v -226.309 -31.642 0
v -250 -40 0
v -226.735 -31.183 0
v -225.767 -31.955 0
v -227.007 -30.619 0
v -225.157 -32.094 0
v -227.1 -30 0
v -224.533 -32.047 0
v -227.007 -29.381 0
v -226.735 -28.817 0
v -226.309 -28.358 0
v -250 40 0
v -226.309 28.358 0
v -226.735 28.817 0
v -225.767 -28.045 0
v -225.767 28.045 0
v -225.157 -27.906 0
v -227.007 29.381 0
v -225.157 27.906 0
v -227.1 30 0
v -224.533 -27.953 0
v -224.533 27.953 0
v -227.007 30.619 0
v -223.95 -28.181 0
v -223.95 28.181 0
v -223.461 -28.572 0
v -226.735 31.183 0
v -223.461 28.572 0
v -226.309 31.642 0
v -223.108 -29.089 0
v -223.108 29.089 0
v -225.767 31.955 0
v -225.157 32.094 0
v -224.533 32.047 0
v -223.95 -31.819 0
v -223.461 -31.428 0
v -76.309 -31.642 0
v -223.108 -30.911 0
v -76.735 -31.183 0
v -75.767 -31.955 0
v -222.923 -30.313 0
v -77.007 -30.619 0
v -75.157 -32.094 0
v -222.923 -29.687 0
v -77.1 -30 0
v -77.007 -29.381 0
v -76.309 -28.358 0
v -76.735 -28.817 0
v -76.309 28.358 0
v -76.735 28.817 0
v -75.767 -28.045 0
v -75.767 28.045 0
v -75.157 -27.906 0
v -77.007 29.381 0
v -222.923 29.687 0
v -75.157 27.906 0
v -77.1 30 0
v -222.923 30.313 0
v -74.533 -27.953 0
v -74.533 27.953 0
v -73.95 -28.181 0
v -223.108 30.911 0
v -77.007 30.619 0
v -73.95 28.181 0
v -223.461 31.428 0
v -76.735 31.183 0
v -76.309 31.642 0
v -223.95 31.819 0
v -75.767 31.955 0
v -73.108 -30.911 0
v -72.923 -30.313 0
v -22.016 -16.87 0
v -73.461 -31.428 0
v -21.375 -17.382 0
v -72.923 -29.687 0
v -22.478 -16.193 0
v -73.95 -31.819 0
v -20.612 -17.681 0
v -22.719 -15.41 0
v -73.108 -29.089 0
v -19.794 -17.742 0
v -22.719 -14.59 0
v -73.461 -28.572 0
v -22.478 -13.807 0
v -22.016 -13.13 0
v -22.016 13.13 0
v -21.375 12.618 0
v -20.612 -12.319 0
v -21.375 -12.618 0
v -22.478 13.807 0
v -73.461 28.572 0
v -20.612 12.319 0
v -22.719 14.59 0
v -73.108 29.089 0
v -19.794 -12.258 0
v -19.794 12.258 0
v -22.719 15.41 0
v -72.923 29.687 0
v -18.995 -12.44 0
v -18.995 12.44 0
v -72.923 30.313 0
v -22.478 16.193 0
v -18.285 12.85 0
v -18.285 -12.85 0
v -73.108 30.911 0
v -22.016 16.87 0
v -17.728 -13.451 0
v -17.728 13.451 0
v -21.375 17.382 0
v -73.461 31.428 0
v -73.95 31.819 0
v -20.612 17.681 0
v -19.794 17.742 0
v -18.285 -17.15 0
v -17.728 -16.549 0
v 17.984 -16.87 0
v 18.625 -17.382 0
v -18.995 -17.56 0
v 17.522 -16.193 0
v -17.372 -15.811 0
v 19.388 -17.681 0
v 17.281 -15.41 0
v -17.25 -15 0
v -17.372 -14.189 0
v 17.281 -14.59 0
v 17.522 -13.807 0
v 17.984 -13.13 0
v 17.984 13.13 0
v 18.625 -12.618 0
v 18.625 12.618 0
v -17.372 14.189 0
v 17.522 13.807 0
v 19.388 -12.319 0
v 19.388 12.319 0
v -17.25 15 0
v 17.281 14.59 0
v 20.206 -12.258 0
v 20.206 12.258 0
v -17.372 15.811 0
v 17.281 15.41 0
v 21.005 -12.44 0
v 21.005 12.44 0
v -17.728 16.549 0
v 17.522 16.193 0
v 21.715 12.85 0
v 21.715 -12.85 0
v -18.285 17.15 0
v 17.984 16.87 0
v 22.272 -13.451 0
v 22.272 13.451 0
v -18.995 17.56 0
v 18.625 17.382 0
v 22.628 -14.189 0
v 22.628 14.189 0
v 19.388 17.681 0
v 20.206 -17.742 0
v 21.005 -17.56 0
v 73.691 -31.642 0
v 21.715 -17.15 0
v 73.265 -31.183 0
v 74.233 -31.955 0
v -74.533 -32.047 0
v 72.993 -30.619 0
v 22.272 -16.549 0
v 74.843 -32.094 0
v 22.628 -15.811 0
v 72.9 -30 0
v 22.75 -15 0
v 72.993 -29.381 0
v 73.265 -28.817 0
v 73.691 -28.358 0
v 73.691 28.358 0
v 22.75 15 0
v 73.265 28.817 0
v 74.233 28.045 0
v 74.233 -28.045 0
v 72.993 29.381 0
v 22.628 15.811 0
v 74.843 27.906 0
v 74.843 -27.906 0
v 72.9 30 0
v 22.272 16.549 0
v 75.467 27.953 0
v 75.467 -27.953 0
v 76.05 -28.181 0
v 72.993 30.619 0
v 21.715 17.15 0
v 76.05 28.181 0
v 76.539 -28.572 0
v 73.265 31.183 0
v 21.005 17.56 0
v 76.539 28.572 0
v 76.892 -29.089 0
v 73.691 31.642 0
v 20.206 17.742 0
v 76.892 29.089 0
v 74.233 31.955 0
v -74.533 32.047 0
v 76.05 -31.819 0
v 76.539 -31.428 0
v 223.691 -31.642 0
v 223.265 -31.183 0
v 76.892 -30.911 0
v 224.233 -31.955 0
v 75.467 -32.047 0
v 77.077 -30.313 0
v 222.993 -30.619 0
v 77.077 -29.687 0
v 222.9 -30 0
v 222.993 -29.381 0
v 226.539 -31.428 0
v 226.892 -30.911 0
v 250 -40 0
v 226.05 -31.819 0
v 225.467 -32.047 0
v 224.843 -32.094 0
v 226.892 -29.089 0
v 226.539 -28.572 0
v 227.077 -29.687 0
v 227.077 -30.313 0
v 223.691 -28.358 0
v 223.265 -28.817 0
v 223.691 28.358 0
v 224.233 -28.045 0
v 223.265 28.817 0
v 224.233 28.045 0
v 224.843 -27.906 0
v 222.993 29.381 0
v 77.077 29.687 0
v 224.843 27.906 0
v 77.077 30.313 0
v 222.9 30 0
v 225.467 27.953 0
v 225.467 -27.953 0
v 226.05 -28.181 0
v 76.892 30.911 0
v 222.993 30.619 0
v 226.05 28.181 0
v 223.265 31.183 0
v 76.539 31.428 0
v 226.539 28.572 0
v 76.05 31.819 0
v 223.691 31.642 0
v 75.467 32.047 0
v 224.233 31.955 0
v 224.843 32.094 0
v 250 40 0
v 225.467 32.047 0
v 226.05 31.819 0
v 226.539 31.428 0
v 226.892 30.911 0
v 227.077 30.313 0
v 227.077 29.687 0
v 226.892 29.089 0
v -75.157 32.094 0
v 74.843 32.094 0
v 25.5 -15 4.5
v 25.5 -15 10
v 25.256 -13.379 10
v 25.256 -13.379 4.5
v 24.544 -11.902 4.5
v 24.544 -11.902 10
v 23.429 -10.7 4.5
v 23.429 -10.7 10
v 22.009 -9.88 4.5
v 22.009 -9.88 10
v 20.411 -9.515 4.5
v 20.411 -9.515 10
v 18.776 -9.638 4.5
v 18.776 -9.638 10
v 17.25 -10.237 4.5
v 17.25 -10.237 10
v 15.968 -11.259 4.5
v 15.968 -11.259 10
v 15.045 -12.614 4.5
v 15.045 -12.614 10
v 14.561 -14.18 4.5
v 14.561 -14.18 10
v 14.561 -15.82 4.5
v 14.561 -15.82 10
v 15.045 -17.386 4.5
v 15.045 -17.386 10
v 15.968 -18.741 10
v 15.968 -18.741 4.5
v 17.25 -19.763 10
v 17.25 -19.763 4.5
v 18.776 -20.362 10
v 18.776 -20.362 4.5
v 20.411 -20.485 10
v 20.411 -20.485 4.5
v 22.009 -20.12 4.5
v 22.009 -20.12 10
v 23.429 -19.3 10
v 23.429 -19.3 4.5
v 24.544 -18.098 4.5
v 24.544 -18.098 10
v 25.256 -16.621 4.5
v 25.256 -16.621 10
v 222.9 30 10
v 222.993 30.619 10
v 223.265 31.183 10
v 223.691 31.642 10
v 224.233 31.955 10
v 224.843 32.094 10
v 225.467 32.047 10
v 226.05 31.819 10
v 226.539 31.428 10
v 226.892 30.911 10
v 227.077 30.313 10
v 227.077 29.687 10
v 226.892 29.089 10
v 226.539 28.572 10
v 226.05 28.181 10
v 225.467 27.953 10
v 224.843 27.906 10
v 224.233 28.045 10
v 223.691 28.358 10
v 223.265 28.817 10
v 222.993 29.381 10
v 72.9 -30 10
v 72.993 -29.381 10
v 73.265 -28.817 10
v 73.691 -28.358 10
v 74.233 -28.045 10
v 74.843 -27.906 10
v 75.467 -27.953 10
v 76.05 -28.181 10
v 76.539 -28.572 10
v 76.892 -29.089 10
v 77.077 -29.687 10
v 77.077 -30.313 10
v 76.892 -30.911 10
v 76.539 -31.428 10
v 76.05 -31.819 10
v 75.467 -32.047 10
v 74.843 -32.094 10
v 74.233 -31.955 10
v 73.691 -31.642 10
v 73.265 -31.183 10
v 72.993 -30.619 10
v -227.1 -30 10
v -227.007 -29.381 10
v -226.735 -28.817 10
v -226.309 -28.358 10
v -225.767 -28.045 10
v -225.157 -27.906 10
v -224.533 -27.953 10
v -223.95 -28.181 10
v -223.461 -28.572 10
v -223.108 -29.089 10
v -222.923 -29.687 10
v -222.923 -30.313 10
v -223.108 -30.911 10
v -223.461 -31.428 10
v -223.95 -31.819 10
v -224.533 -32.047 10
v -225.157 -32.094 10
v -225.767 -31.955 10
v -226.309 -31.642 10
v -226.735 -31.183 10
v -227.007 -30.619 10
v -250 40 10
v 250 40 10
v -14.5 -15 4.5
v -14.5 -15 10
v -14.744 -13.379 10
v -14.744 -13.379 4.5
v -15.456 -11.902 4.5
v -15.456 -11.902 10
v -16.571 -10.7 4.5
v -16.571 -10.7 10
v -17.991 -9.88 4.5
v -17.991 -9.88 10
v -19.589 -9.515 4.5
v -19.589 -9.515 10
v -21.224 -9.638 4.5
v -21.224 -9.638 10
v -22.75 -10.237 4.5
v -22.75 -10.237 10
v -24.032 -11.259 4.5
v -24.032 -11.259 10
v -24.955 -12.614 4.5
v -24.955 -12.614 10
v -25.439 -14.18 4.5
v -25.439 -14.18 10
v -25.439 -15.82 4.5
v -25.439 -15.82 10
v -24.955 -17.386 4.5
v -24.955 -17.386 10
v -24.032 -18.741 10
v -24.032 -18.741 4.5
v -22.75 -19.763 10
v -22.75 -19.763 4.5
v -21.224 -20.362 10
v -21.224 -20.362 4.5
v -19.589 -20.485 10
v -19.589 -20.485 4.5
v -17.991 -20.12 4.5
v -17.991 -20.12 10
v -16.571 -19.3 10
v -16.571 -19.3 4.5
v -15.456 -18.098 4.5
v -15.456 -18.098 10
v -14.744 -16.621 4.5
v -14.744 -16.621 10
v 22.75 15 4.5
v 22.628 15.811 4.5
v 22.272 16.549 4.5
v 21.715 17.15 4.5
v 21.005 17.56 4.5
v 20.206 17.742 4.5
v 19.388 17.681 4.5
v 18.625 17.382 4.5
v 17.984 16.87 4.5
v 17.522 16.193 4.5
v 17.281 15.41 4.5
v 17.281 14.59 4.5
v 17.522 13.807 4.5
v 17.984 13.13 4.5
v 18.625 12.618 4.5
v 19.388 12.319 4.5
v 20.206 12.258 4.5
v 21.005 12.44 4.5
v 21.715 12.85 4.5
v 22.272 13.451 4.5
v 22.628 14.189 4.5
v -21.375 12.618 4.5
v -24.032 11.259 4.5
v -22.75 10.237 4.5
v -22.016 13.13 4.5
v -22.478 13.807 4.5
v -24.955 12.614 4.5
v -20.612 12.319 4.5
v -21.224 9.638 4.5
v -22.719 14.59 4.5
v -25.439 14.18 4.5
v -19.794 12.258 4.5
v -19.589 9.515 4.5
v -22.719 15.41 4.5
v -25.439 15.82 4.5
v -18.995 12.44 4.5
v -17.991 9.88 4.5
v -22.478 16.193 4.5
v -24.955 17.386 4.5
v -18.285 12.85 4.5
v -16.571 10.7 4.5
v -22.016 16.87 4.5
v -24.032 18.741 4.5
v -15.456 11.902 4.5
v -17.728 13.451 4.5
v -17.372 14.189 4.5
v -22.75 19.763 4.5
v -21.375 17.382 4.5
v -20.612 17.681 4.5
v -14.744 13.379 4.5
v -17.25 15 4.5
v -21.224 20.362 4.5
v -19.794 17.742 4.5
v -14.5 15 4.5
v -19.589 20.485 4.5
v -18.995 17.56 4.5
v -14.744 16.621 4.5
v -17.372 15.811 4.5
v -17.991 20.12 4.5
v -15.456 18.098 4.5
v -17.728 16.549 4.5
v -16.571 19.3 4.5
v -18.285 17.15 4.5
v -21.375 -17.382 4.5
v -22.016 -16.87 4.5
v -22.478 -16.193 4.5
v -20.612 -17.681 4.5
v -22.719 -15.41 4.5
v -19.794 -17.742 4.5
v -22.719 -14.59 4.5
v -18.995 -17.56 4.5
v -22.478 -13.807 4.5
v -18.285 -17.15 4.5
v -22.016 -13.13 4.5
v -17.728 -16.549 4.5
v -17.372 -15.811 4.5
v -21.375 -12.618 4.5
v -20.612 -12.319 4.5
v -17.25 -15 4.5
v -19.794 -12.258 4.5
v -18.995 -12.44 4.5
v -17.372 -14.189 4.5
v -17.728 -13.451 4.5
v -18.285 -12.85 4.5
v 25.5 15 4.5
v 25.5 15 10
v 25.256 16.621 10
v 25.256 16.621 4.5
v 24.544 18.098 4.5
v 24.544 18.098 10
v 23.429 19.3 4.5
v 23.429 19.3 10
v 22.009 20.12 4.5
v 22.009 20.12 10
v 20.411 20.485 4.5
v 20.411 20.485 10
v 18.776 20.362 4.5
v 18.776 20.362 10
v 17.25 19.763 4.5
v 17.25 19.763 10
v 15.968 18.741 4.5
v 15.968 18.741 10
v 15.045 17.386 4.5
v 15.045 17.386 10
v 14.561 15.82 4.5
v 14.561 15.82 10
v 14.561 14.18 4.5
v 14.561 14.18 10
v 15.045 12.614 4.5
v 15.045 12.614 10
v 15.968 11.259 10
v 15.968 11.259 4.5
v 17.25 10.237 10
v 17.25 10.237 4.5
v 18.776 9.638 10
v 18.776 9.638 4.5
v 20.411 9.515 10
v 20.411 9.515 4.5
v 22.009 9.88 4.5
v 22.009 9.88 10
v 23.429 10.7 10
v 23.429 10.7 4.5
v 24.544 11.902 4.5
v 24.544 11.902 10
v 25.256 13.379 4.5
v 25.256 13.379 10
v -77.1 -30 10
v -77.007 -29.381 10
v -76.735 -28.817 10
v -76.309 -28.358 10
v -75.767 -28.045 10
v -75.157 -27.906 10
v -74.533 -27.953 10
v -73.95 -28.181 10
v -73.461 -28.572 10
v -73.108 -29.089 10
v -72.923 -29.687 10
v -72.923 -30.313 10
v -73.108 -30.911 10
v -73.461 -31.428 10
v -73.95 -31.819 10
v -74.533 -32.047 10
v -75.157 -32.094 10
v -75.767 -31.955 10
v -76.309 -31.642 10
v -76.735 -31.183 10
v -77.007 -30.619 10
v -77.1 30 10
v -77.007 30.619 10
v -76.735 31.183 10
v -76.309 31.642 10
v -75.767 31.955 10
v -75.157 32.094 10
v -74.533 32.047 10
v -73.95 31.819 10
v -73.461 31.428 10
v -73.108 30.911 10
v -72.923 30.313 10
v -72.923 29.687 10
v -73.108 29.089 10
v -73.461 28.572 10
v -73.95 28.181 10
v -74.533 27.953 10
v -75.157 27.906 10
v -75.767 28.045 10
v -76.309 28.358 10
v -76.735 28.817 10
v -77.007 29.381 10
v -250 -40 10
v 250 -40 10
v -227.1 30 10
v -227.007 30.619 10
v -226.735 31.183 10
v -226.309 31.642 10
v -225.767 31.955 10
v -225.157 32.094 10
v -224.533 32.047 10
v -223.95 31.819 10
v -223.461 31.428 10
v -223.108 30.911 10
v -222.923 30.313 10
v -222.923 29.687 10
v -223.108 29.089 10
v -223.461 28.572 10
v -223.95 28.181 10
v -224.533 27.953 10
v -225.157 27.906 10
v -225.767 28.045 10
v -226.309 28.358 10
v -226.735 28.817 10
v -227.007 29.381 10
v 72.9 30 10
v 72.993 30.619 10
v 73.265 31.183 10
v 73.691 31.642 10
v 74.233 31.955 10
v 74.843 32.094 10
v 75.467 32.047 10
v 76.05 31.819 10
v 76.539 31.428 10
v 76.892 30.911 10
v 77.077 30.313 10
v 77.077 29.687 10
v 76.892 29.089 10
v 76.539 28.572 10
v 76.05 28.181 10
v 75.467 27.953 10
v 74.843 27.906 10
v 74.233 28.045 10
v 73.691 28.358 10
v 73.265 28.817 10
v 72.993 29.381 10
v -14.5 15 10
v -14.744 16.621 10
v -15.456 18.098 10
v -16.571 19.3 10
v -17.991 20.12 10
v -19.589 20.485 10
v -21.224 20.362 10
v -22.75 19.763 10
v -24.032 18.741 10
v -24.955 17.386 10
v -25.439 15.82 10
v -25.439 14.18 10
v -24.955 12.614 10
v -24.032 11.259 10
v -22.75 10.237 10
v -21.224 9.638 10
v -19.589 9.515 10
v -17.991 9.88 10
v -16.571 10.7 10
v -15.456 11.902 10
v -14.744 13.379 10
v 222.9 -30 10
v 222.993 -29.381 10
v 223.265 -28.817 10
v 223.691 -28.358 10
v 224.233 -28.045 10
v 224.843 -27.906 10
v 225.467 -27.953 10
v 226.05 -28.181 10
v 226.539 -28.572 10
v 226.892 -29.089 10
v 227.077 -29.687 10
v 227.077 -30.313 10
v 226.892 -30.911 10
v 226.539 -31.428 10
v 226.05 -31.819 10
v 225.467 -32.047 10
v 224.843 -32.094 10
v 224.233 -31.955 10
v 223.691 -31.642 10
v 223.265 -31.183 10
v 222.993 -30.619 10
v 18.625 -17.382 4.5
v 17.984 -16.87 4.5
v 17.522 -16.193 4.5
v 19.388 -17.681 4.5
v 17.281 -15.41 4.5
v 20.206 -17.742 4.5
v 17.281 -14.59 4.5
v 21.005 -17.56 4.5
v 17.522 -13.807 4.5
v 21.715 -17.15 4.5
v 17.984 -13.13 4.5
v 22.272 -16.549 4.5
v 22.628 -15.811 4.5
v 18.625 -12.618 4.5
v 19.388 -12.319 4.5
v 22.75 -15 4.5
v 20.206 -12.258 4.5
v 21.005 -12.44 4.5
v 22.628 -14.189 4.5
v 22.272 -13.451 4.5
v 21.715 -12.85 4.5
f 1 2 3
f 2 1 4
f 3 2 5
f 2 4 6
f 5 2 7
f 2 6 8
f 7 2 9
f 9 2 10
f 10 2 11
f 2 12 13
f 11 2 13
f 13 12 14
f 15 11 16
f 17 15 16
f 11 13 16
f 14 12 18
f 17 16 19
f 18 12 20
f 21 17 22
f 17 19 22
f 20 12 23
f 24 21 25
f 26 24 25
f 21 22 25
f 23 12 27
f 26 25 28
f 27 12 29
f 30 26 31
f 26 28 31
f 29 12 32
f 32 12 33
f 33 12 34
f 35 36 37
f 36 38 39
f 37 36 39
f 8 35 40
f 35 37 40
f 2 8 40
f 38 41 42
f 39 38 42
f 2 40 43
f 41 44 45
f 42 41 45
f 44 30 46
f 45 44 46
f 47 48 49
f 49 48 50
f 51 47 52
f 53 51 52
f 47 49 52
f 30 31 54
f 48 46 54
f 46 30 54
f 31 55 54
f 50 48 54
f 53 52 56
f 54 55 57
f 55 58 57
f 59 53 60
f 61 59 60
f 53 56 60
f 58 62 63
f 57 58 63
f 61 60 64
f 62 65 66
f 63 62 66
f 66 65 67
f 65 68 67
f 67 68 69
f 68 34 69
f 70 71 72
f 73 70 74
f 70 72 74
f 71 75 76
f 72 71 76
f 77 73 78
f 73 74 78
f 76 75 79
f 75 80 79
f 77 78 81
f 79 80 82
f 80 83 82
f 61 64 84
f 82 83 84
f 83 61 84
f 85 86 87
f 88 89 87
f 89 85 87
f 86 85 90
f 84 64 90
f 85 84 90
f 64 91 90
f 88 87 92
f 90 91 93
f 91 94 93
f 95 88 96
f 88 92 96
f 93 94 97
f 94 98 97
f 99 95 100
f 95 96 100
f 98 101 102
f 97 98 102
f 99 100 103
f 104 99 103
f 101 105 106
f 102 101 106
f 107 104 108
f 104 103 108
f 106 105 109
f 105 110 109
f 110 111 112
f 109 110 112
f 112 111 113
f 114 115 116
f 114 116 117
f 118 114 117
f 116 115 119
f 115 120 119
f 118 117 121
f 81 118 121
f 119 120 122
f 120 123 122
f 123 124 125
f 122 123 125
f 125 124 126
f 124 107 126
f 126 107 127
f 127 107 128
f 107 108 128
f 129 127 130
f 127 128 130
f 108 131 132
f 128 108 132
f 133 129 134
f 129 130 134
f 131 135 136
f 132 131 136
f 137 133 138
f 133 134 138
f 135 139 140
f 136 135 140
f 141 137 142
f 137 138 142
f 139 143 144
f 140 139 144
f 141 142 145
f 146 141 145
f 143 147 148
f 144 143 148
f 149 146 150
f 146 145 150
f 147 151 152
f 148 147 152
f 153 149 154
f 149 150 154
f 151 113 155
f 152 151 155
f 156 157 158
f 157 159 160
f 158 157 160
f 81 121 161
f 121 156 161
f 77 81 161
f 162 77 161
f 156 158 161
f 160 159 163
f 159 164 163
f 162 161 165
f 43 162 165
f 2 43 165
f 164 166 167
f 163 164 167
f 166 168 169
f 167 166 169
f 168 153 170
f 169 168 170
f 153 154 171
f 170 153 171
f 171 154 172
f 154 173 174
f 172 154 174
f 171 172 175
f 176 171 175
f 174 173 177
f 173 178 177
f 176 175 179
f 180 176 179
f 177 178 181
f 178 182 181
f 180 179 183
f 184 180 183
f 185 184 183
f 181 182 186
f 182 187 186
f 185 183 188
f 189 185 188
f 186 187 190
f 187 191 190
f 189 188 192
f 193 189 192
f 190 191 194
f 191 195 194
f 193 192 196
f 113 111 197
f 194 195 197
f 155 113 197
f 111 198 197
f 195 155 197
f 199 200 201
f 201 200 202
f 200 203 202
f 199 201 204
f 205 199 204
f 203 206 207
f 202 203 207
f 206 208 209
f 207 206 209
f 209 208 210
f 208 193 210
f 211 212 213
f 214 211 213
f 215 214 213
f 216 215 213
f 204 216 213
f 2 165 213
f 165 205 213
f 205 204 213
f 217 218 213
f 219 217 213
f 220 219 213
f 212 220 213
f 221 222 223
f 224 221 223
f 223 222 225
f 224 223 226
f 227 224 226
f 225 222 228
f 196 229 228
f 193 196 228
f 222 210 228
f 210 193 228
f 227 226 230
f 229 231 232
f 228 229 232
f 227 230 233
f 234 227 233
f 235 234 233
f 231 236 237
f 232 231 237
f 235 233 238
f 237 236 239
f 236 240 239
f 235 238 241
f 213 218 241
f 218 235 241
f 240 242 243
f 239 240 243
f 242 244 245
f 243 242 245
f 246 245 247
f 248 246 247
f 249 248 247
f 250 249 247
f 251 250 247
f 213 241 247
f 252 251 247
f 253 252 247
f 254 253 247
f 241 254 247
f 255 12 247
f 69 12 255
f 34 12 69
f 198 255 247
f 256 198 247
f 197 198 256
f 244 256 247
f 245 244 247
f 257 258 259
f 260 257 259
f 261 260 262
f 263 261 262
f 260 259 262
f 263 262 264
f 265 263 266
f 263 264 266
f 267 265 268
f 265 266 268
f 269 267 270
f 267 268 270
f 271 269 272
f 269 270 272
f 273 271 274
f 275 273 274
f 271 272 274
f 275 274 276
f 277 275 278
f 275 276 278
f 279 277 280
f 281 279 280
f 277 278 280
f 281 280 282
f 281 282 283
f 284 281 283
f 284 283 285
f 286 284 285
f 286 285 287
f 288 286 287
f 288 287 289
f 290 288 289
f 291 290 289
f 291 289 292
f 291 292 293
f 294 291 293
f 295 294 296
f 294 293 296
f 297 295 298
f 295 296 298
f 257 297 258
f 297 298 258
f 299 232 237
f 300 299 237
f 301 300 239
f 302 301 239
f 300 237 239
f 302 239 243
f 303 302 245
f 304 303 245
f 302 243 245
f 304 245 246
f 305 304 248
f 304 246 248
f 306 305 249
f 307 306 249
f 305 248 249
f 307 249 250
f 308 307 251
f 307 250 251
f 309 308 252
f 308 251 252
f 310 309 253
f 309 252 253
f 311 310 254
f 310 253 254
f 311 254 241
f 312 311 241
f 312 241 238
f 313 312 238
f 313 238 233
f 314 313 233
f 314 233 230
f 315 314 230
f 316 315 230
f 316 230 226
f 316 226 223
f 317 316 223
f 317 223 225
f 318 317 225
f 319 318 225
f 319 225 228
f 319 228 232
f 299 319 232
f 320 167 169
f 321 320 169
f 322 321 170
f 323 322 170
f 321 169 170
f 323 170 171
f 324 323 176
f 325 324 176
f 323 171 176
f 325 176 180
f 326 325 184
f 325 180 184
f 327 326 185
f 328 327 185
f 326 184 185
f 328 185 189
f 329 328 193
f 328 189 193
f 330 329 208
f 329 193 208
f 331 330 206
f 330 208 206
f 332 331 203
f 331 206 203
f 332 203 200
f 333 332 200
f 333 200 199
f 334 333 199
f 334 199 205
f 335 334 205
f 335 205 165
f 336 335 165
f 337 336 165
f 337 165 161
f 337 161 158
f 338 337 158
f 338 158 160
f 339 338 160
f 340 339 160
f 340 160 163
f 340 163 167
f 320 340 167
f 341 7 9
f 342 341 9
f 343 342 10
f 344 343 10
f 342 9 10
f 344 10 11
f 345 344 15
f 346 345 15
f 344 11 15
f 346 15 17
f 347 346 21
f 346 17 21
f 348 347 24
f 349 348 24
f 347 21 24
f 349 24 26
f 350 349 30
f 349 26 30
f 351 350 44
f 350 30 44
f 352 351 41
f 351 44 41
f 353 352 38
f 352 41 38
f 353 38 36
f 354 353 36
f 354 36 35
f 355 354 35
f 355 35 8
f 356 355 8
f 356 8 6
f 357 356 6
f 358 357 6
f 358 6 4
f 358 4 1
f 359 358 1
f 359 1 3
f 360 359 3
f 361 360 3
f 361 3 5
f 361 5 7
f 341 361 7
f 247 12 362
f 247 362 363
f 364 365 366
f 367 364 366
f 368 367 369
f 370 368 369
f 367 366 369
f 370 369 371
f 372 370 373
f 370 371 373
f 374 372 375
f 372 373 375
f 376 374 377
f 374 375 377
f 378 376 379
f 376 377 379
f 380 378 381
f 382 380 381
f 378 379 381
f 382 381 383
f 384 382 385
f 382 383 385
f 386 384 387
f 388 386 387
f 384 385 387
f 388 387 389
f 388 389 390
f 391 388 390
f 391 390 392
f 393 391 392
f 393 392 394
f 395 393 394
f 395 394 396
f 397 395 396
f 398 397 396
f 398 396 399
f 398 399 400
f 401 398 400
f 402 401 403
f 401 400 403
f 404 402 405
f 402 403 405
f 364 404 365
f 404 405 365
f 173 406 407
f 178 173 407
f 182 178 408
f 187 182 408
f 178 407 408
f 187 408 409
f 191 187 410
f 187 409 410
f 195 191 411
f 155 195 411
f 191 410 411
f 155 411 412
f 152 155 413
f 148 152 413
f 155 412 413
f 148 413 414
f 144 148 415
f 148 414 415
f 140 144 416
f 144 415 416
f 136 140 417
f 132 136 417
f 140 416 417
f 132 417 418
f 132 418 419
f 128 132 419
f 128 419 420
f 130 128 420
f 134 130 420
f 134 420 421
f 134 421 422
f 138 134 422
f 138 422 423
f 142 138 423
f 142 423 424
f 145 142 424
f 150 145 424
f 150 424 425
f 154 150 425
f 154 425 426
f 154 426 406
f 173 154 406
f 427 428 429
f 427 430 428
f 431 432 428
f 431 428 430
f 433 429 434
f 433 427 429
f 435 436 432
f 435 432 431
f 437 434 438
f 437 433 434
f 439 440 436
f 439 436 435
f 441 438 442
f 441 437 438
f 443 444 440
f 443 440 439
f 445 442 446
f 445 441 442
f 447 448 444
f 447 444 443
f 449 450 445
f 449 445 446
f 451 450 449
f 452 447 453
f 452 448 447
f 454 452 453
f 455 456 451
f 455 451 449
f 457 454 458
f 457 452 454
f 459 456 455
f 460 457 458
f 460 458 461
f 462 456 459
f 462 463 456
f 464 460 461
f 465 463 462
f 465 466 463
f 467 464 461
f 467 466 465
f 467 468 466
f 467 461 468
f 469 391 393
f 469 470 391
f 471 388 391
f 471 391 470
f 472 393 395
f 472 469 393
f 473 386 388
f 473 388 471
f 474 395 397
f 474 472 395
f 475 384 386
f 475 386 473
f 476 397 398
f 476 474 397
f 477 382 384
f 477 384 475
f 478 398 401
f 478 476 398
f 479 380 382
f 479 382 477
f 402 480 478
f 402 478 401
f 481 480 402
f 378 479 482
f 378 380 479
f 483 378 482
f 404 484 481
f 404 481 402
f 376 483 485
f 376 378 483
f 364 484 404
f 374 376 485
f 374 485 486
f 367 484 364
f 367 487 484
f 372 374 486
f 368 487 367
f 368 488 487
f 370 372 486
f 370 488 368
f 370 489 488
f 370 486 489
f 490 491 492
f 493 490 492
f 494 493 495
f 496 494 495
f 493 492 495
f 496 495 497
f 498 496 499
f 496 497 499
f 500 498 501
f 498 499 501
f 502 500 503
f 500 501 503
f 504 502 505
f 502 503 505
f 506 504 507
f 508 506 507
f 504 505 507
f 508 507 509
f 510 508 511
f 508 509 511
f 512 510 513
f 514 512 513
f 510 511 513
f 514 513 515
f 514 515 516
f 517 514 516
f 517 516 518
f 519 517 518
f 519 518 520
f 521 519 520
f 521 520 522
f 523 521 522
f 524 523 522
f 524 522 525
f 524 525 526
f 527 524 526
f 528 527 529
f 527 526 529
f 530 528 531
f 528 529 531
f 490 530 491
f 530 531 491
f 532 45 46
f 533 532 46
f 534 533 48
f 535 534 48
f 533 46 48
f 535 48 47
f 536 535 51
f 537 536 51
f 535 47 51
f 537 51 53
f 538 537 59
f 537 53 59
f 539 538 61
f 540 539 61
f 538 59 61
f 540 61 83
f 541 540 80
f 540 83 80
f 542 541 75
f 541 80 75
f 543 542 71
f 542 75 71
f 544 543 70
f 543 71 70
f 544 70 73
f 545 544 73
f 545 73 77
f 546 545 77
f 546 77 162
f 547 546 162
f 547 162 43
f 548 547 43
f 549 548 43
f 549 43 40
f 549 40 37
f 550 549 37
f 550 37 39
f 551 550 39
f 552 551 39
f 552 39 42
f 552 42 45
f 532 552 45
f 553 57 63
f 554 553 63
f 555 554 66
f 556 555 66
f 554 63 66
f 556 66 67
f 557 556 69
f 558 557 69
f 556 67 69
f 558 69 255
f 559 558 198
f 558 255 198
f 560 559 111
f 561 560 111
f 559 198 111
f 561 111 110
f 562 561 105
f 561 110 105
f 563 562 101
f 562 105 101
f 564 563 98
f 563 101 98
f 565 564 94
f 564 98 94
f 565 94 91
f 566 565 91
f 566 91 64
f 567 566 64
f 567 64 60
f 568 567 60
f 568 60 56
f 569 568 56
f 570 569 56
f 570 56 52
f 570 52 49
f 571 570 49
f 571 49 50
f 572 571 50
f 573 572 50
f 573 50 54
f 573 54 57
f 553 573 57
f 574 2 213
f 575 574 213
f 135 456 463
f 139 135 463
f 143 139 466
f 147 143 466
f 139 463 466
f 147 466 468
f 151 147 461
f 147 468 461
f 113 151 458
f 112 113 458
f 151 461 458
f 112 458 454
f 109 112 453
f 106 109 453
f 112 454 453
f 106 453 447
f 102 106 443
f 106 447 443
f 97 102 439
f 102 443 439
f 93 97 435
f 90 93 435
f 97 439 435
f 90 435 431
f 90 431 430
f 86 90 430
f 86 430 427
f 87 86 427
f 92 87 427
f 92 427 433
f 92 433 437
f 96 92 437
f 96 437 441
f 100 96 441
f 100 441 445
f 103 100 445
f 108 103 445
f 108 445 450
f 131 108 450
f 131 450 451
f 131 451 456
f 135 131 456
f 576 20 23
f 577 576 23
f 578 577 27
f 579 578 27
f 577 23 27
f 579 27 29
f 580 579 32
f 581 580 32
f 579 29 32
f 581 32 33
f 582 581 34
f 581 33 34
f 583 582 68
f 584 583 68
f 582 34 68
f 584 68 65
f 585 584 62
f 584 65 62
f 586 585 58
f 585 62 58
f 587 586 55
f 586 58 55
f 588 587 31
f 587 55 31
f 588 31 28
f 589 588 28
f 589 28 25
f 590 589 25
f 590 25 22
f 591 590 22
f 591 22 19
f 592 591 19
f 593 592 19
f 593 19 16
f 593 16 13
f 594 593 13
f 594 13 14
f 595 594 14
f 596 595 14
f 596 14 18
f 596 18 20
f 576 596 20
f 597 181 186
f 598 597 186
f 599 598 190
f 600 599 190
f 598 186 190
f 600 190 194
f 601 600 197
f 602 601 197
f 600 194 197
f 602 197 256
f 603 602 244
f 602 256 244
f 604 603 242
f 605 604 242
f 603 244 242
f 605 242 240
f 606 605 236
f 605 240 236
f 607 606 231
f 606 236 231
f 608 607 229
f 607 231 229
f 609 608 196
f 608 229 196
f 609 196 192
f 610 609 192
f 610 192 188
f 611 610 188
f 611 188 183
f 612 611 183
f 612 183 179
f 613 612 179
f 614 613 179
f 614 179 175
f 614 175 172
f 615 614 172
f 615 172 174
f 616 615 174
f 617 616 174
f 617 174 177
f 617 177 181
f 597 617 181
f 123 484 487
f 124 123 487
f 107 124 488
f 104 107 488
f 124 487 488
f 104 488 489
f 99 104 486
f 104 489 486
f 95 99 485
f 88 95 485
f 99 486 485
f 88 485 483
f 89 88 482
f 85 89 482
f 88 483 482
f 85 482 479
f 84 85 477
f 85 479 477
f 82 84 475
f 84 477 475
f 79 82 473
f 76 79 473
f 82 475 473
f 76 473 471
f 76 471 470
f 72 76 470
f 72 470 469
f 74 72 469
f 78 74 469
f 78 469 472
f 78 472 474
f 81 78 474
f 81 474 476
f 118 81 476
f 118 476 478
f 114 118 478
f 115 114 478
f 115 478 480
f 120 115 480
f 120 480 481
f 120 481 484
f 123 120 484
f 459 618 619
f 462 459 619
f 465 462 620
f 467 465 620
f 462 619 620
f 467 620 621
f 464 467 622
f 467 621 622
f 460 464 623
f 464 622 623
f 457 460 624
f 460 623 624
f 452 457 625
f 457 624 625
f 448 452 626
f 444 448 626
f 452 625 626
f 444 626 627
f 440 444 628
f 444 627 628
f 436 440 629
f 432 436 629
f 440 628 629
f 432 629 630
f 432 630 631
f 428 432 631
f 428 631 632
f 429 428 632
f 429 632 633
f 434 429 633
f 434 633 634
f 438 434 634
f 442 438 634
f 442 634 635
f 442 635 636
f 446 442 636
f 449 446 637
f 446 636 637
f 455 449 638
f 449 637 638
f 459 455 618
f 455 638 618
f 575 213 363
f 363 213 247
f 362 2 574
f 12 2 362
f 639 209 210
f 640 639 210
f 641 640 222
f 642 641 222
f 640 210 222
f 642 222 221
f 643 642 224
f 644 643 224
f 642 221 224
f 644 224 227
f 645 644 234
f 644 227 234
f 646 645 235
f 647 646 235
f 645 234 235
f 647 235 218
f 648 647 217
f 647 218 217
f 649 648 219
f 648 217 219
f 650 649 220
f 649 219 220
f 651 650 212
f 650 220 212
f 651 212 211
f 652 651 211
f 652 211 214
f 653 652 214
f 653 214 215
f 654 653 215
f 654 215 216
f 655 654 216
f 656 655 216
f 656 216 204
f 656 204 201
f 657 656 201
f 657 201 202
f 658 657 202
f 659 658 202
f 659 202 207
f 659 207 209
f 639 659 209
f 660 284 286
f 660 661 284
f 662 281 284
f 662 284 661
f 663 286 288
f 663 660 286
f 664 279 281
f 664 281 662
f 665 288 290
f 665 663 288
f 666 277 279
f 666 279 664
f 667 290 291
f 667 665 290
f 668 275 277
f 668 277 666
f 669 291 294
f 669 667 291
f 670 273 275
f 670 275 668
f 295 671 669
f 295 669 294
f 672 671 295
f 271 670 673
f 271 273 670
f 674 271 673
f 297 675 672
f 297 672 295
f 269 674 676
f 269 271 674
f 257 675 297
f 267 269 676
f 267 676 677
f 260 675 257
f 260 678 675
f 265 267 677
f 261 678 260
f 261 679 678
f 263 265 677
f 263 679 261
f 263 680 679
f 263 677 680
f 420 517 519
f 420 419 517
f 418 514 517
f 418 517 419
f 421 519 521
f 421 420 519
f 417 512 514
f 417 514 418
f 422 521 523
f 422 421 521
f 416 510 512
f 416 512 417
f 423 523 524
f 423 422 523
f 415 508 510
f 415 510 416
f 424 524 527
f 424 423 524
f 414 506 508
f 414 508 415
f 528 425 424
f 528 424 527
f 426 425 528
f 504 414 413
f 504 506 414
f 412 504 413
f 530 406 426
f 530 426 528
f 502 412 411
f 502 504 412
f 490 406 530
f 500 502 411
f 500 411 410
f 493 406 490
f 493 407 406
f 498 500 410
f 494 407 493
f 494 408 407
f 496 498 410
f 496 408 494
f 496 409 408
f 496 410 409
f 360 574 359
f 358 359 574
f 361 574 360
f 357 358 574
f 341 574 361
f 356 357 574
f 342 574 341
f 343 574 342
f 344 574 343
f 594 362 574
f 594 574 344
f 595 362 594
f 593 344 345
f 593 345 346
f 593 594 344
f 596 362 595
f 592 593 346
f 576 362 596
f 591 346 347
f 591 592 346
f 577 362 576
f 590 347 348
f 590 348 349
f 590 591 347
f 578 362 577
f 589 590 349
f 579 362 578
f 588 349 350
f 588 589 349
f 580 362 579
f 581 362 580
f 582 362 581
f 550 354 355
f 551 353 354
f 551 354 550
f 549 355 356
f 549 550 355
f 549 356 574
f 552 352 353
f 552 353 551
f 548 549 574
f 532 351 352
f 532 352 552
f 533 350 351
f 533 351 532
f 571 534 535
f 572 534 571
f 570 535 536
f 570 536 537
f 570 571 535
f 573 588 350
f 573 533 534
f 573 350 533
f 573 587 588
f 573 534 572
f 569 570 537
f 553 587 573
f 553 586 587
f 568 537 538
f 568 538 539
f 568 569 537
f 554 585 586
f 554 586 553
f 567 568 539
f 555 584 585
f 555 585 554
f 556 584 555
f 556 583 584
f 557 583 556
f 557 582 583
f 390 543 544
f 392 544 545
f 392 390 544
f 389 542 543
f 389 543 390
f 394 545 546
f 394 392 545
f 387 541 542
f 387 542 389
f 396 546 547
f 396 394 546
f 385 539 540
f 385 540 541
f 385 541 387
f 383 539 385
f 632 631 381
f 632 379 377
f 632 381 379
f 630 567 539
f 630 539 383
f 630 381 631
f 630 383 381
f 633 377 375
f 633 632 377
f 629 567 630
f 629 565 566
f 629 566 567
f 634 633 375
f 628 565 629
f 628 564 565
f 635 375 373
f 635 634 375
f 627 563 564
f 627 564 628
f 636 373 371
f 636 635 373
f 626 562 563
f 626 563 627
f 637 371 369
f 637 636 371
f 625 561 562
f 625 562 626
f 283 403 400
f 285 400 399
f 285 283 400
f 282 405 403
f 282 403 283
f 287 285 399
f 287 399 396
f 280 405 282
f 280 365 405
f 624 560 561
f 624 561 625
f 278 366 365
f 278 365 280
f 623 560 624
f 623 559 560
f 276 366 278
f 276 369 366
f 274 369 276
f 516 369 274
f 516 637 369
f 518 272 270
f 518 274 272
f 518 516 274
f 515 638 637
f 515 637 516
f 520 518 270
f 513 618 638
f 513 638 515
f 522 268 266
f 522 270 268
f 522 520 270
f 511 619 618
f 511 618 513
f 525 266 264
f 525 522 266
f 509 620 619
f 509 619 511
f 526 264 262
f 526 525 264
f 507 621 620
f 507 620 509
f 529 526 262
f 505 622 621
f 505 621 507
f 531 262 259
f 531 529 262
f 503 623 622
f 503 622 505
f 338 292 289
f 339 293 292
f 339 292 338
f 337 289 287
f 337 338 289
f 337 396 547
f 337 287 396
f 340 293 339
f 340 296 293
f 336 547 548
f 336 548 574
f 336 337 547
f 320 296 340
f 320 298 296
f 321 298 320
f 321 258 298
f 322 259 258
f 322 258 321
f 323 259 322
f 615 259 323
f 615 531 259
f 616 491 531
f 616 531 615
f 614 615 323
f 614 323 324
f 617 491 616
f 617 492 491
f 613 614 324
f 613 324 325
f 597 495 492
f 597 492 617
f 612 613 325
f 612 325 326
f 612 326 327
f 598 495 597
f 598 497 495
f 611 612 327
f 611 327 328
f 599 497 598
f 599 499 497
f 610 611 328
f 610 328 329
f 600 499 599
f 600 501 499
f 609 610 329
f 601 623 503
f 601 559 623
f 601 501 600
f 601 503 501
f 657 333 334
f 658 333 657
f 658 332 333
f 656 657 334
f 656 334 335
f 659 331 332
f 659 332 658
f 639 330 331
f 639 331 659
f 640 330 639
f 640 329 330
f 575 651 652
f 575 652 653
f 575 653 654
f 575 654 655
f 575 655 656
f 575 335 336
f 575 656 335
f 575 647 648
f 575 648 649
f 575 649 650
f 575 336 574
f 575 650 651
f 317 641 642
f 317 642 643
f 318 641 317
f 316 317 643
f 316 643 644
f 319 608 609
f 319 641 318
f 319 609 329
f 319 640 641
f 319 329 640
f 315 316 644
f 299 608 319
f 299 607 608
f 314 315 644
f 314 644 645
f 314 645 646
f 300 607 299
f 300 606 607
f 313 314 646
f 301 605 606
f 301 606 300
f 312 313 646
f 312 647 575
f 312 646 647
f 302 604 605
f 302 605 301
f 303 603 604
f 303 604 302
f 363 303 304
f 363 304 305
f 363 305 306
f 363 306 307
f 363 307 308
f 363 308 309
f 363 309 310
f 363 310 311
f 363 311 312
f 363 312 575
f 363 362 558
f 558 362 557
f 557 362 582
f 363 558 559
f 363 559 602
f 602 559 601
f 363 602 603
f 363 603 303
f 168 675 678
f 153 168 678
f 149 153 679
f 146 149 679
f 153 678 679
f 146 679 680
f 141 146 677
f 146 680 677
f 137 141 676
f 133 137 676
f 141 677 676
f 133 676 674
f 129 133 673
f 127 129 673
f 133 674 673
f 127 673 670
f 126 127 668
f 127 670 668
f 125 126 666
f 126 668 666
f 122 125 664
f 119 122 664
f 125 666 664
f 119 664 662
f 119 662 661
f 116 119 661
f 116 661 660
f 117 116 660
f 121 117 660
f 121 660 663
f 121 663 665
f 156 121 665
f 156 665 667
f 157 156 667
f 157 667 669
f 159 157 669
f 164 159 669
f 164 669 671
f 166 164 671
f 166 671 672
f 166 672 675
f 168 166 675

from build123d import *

# Parameters (mm, degrees)
SKETCH1_W             = 500
SKETCH1_H             = 80
BOSS_EXTRUDE1_DEPTH   = 10
SKETCH2_R             = 2.75
CUT_EXTRUDE1_DEPTH    = 11
SKETCH3_R             = 5.5
CUT_EXTRUDE2_DEPTH    = 5.5
M5_TAPPED_HOLE1_D     = 4.2
M5_TAPPED_HOLE1_DEPTH = 12.4
M5_TAPPED_HOLE1_TIP   = 1.2618073


with BuildPart() as part:
    # Sketch1 → Boss-Extrude1 (new body)
    with BuildSketch(Plane.XY):
        Rectangle(SKETCH1_W, SKETCH1_H)
    extrude(amount=BOSS_EXTRUDE1_DEPTH)

    # Sketch2 → Cut-Extrude1 (cut, through all)
    with BuildSketch(Plane.XY.offset(10)):
        with Locations((-20, 15)):
            Circle(SKETCH2_R)
        with Locations((20, 15)):
            Circle(SKETCH2_R)
        with Locations((20, -15)):
            Circle(SKETCH2_R)
        with Locations((-20, -15)):
            Circle(SKETCH2_R)
    extrude(amount=-CUT_EXTRUDE1_DEPTH, mode=Mode.SUBTRACT)

    # Sketch3 → Cut-Extrude2 (cut)
    with BuildSketch(Plane.XY.offset(10)):
        with Locations((20, 15)):
            Circle(SKETCH3_R)
        with Locations((20, -15)):
            Circle(SKETCH3_R)
        with Locations((-20, -15)):
            Circle(SKETCH3_R)
        with Locations((-20, 15)):
            Circle(SKETCH3_R)
    extrude(amount=-CUT_EXTRUDE2_DEPTH, mode=Mode.SUBTRACT)

    # M5 Tapped Hole1
    with Locations(Plane.XY.offset(10)):
        with Locations((-225, 30), (-225, -30), (-75, -30), (-75, 30), (75, 30), (75, -30), (225, -30), (225, 30)):
            Hole(M5_TAPPED_HOLE1_D / 2, depth=M5_TAPPED_HOLE1_DEPTH)
            with Locations((0, 0, -(M5_TAPPED_HOLE1_DEPTH + M5_TAPPED_HOLE1_TIP / 2))):  # 118° drill point
                Cone(0, M5_TAPPED_HOLE1_D / 2, M5_TAPPED_HOLE1_TIP, mode=Mode.SUBTRACT)


solid = part.part
